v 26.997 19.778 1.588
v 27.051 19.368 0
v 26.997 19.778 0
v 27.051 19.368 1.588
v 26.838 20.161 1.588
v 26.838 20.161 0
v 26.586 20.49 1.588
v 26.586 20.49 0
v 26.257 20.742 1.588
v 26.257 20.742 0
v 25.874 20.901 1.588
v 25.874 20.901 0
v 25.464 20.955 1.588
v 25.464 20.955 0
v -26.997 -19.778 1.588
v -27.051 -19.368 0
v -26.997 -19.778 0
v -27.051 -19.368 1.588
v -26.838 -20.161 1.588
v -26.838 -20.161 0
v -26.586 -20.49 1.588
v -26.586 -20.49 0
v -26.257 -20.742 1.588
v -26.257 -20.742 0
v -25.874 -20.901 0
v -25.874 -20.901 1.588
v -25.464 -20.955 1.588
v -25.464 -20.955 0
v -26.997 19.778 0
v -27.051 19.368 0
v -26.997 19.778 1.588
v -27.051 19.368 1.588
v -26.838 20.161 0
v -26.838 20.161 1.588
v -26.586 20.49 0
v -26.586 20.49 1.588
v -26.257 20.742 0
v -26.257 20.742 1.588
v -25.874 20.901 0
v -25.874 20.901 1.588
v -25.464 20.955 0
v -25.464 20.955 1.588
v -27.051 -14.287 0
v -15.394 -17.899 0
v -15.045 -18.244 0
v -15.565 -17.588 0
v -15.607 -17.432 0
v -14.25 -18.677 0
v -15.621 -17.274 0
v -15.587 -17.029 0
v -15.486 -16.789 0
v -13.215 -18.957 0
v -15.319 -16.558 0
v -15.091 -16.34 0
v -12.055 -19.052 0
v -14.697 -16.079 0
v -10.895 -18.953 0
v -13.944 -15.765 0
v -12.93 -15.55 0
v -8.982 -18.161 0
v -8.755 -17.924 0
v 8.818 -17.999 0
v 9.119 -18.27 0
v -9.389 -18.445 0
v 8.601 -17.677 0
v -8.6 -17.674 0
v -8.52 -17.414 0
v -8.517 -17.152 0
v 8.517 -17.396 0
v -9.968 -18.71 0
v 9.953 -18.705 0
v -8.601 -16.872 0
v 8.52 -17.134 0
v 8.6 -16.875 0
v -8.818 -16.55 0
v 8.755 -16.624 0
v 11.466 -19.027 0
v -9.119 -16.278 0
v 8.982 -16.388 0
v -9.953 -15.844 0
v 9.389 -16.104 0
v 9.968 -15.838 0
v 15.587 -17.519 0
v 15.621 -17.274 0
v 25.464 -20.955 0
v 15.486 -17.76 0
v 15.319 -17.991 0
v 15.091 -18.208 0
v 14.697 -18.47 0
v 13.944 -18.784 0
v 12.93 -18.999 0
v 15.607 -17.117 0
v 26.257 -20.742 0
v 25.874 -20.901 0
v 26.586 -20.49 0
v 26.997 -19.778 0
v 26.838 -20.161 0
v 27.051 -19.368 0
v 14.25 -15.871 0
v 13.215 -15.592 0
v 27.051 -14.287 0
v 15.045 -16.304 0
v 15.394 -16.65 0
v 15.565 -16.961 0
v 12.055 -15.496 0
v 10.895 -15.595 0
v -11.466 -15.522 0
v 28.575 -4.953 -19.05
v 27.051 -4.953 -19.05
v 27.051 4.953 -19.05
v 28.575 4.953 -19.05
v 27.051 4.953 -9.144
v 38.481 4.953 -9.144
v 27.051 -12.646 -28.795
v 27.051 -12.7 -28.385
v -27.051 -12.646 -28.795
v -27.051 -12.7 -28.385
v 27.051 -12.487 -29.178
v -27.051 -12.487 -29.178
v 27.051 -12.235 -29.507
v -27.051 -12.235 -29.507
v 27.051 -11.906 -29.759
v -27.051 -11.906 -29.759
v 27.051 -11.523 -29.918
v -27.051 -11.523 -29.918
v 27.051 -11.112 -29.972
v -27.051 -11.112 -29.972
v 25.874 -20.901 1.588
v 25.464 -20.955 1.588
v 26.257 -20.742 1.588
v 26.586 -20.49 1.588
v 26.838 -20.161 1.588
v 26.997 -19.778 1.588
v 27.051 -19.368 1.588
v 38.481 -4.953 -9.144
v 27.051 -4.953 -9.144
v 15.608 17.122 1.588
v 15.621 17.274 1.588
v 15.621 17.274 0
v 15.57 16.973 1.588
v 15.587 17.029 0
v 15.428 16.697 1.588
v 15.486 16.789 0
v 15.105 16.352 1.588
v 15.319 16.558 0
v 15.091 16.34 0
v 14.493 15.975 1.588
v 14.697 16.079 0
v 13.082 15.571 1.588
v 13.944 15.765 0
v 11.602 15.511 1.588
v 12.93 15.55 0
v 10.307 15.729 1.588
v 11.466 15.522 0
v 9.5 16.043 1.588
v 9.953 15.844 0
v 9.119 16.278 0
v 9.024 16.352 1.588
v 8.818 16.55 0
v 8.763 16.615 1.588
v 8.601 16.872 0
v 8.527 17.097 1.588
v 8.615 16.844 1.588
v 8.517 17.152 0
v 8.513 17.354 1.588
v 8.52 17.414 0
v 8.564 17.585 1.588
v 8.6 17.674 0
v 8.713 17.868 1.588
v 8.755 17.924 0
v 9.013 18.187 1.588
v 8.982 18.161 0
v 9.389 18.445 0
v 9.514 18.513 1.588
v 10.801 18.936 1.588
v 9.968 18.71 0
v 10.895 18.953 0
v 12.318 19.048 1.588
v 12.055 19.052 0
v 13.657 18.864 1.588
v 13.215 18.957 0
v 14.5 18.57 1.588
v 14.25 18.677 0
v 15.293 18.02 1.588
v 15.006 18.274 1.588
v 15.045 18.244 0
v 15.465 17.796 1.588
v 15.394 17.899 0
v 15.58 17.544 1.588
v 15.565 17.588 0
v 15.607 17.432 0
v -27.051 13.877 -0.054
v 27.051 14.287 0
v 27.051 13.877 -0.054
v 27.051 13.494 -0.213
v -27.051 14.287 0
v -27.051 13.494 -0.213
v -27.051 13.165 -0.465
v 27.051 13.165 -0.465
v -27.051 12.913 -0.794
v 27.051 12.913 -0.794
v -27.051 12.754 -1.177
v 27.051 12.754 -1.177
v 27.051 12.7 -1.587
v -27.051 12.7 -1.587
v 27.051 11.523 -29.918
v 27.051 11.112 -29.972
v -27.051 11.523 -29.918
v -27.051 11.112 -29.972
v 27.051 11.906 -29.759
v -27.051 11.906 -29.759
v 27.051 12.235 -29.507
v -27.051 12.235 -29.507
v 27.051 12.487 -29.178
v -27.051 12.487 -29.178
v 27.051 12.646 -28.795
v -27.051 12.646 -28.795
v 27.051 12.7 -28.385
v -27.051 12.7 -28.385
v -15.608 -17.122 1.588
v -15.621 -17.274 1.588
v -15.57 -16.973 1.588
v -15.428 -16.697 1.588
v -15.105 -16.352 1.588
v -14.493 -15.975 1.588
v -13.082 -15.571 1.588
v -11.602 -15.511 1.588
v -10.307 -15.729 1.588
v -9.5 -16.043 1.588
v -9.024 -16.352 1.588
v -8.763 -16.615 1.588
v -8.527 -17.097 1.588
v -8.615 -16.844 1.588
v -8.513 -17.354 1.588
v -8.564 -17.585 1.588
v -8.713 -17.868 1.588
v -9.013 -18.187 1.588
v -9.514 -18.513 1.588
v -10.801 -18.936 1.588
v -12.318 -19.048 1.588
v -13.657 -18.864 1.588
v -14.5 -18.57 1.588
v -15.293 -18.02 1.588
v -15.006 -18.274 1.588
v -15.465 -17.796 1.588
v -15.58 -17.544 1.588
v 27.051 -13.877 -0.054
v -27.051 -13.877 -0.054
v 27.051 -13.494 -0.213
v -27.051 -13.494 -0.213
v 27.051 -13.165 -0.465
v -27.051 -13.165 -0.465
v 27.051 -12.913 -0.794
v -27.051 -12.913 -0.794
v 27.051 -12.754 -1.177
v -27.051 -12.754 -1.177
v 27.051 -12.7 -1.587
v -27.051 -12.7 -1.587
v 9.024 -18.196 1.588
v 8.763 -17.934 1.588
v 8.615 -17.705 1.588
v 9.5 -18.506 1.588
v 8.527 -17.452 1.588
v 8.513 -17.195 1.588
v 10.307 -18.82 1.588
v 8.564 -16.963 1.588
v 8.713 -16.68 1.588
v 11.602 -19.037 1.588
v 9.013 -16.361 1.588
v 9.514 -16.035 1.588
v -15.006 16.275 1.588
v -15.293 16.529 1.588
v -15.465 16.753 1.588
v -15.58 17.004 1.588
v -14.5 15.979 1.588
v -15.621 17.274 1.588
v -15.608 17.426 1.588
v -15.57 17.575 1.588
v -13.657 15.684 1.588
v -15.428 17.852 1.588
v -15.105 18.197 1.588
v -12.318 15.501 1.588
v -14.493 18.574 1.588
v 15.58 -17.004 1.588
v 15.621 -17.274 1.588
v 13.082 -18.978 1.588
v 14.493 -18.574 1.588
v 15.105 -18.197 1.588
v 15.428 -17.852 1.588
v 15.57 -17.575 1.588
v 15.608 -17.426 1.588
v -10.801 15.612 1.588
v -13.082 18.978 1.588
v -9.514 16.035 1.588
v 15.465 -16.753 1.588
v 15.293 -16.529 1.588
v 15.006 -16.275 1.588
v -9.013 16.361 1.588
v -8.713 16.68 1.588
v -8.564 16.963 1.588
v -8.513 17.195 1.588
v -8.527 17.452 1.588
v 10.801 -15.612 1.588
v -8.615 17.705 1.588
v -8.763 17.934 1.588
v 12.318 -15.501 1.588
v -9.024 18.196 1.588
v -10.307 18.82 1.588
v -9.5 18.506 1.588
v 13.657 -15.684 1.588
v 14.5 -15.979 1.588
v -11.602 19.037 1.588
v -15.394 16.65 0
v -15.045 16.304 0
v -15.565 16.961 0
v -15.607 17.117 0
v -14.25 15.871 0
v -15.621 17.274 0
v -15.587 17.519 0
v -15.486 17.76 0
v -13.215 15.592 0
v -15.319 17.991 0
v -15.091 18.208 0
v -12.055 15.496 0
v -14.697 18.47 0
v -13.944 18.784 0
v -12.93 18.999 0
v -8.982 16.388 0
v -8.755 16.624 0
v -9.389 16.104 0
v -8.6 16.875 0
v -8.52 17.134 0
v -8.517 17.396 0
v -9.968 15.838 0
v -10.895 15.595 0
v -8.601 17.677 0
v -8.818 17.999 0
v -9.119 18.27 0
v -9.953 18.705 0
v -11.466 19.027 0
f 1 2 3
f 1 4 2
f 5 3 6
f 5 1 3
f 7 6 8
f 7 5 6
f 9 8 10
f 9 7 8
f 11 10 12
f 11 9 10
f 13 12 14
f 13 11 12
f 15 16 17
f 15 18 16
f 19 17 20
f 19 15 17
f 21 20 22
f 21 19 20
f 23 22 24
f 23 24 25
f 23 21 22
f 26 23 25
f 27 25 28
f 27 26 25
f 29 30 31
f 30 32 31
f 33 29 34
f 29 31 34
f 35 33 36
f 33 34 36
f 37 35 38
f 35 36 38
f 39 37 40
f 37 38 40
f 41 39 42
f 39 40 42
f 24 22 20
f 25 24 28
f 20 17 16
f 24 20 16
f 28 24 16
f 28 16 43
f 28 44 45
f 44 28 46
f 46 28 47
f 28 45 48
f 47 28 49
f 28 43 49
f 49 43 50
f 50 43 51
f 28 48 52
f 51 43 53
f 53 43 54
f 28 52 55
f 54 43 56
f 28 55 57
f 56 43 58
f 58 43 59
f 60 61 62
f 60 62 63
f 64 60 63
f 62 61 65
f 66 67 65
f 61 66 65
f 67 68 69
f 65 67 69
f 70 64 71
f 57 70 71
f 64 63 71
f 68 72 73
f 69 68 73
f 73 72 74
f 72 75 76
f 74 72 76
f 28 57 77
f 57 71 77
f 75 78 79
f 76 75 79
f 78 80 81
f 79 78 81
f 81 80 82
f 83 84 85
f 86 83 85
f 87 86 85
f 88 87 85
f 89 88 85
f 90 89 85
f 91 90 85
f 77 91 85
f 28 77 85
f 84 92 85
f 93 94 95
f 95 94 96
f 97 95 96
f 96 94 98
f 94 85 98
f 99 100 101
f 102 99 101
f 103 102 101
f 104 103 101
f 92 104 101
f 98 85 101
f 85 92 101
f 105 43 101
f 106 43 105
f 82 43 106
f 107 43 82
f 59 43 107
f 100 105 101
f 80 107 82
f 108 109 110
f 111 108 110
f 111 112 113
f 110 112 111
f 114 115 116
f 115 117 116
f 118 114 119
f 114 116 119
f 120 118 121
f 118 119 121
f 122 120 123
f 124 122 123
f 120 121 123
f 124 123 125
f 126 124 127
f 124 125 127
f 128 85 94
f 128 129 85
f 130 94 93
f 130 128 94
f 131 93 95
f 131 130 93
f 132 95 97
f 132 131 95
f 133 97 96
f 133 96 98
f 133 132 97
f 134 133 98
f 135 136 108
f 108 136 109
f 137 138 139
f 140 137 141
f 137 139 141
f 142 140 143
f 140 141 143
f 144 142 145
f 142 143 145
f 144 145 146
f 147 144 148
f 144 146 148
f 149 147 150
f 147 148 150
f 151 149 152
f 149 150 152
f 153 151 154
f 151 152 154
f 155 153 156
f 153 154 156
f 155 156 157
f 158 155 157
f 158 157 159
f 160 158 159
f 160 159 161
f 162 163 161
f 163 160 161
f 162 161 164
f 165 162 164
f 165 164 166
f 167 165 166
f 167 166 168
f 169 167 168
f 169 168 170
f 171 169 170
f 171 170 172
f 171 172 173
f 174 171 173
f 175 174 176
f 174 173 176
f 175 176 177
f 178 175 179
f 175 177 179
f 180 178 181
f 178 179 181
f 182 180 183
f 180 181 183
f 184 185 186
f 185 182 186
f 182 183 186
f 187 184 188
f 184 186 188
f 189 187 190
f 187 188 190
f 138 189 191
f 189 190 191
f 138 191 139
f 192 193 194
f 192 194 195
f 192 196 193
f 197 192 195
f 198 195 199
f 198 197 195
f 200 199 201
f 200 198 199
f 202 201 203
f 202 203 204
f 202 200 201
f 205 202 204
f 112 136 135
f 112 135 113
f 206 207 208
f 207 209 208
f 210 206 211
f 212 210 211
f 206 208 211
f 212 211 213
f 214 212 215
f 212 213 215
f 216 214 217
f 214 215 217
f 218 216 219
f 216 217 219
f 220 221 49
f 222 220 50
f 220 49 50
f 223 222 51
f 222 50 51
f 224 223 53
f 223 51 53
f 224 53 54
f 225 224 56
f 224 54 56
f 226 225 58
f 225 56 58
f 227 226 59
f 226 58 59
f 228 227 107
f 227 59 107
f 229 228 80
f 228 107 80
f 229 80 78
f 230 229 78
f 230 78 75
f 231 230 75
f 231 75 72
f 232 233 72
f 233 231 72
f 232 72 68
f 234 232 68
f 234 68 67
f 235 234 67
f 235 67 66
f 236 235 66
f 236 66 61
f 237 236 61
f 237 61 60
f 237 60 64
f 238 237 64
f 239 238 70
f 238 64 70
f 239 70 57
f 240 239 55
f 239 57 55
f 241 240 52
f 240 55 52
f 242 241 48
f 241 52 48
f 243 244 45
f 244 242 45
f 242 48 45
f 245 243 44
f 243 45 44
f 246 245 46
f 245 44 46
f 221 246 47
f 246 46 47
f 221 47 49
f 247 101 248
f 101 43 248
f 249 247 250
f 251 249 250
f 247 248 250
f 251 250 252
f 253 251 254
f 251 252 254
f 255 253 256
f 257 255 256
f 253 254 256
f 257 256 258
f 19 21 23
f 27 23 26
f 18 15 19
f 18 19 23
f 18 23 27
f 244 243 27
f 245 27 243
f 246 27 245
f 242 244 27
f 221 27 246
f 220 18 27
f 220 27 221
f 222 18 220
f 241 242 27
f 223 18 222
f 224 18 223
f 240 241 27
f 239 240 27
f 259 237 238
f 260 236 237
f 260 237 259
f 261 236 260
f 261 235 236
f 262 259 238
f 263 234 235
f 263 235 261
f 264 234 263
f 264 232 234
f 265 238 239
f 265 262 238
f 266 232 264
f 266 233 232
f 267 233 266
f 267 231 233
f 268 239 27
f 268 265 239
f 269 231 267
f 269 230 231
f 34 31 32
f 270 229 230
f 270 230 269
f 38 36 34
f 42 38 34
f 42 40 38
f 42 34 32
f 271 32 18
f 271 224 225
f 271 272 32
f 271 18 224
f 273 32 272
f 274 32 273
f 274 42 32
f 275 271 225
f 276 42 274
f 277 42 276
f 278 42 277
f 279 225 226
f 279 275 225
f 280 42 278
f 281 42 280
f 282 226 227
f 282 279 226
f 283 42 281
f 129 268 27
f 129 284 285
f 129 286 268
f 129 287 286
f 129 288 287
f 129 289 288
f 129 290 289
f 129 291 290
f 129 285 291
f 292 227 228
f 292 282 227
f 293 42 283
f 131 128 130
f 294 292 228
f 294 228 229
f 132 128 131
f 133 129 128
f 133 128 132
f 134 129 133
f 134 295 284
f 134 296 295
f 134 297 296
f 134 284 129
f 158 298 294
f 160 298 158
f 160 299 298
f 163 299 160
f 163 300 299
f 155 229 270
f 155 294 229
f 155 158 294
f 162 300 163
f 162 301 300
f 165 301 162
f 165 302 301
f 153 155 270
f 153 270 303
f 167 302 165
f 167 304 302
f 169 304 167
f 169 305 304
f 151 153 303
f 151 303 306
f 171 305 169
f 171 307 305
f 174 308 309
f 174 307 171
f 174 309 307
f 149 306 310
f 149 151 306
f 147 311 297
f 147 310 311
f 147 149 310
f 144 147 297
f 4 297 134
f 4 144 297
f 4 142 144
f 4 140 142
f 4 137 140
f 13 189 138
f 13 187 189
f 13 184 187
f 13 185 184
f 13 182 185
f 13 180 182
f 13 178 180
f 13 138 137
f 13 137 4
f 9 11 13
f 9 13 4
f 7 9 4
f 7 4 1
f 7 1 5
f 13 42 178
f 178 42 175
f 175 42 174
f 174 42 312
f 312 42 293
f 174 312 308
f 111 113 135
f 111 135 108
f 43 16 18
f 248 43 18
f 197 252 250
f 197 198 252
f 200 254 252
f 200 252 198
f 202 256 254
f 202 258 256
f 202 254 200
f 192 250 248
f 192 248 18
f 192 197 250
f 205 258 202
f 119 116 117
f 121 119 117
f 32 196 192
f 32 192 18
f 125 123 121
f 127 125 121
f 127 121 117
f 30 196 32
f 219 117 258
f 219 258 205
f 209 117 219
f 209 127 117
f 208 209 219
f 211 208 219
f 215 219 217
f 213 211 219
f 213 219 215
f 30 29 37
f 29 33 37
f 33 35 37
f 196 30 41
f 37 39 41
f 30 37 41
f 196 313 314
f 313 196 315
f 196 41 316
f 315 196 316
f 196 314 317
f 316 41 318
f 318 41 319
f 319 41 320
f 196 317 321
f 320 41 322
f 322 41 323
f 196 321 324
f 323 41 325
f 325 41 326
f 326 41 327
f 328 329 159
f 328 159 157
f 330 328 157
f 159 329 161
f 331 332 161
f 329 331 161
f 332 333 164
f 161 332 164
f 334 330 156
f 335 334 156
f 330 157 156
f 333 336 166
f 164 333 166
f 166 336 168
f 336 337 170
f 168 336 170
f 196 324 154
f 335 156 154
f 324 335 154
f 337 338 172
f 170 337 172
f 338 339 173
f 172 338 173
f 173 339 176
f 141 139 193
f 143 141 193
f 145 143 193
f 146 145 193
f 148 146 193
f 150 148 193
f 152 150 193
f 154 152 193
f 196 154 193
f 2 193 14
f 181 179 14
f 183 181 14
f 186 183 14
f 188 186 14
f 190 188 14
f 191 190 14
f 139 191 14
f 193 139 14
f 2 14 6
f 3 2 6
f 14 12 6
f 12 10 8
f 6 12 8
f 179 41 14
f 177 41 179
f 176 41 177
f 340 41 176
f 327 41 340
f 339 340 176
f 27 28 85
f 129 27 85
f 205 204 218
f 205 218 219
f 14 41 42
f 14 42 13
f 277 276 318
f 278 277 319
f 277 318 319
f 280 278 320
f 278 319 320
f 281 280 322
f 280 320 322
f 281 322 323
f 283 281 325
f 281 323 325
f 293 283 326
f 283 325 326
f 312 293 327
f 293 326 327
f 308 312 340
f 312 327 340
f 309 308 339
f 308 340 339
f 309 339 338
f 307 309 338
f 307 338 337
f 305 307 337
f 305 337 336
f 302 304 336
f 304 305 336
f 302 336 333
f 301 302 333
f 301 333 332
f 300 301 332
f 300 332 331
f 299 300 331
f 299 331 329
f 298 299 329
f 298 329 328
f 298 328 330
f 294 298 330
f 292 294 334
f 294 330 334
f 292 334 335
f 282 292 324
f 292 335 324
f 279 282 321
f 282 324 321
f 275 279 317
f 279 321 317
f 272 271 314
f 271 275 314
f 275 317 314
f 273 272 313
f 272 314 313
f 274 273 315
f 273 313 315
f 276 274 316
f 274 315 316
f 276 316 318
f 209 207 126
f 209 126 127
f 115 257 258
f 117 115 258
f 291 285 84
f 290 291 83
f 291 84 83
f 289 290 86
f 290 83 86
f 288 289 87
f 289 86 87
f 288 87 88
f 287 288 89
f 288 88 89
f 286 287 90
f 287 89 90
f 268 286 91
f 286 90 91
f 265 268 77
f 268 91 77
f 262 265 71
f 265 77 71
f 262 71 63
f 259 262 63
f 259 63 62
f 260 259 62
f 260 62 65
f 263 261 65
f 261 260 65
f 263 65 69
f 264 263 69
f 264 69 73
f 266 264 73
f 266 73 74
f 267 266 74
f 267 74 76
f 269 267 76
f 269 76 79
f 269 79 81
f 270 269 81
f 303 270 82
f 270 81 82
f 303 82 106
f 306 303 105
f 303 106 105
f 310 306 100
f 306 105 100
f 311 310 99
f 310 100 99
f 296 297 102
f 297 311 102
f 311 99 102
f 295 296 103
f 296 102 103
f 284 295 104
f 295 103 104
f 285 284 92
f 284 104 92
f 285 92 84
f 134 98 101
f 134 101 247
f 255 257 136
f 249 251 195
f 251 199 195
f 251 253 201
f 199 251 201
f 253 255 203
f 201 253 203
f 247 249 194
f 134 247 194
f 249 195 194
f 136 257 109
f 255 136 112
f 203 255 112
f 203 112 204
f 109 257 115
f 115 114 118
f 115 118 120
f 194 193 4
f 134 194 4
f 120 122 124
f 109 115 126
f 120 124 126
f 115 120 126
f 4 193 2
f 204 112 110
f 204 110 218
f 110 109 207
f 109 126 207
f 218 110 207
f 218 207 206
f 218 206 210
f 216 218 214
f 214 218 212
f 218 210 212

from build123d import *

# Parameters (mm, degrees)
SKETCH1_W           = 54.102
SKETCH1_H           = 41.91
BOSS_EXTRUDE1_DEPTH = 1.5875
FILLET1_R           = 1.5875
SKETCH2_W           = 54.102
SKETCH2_H           = 25.4
BOSS_EXTRUDE2_DEPTH = 29.972
FILLET2_R           = 1.5875
FILLET3_R           = 1.5875
SKETCH3_RX          = 3.556
SKETCH3_RY          = 1.778
CUT_EXTRUDE1_DEPTH  = 2.5875
SKETCH4_W           = 9.906
SKETCH4_H           = 9.906
BOSS_EXTRUDE3_DEPTH = 11.43
CUT_EXTRUDE2_DEPTH  = 26.9080001


with BuildPart() as part:
    # Sketch1 → Boss-Extrude1 (new body)
    with BuildSketch(Plane.XY):
        Rectangle(SKETCH1_W, SKETCH1_H)
    extrude(amount=BOSS_EXTRUDE1_DEPTH)

    # Fillet1
    fillet1_edges = [part.edges().sort_by_distance(p)[0] for p in [
        (27.051, -20.955, 0.79375),
        (-27.051, -20.955, 0.79375),
        (-27.051, 20.955, 0.79375),
        (27.051, 20.955, 0.79375),
    ]]
    fillet(fillet1_edges, radius=FILLET1_R)

    # Sketch2 → Boss-Extrude2 (add)
    with BuildSketch(Plane(origin=(0, 0, 0), x_dir=(-1, 0, 0), z_dir=(0, 0, -1))):
        Rectangle(SKETCH2_W, SKETCH2_H)
    extrude(amount=BOSS_EXTRUDE2_DEPTH)

    # Fillet2
    fillet2_edges = [part.edges().sort_by_distance(p)[0] for p in [
        (0, 12.7, 0),
        (0, -12.7, 0),
    ]]
    fillet(fillet2_edges, radius=FILLET2_R)

    # Fillet3
    fillet3_edges = [part.edges().sort_by_distance(p)[0] for p in [
        (0, 12.7, -29.972),
        (0, -12.7, -29.972),
    ]]
    fillet(fillet3_edges, radius=FILLET3_R)

    # Sketch3 → Cut-Extrude1 (cut, through all)
    with BuildSketch(Plane(origin=(0, 0, 0), x_dir=(-1, 0, 0), z_dir=(0, 0, -1))):
        with Locations(Location((-12.065, -17.274273354), (0, 0, 180))):
            Ellipse(SKETCH3_RX, SKETCH3_RY)
        with Locations((12.065, -17.274273354)):
            Ellipse(SKETCH3_RX, SKETCH3_RY)
        with Locations((12.065, 17.274273354)):
            Ellipse(SKETCH3_RX, SKETCH3_RY)
        with Locations(Location((-12.065, 17.274273354), (0, 0, 180))):
            Ellipse(SKETCH3_RX, SKETCH3_RY)
    extrude(amount=-CUT_EXTRUDE1_DEPTH, mode=Mode.SUBTRACT)

    # Sketch4 → Boss-Extrude3 (add)
    with BuildSketch(Plane(origin=(27.051, 0, 0), x_dir=(0, 0, -1), z_dir=(1, 0, 0))):
        with Locations((14.097, 0)):
            Rectangle(SKETCH4_W, SKETCH4_H)
    extrude(amount=BOSS_EXTRUDE3_DEPTH)

    # Sketch6 → Cut-Extrude2 (cut, through all)
    with BuildSketch(Plane(origin=(0, 4.953, 0), x_dir=(1, 0, 0), z_dir=(0, 1, 0))):
        Polygon((38.481, 9.144), (28.575, 19.05), (38.481, 19.05), align=None)
    extrude(amount=-CUT_EXTRUDE2_DEPTH, mode=Mode.SUBTRACT)


solid = part.part
